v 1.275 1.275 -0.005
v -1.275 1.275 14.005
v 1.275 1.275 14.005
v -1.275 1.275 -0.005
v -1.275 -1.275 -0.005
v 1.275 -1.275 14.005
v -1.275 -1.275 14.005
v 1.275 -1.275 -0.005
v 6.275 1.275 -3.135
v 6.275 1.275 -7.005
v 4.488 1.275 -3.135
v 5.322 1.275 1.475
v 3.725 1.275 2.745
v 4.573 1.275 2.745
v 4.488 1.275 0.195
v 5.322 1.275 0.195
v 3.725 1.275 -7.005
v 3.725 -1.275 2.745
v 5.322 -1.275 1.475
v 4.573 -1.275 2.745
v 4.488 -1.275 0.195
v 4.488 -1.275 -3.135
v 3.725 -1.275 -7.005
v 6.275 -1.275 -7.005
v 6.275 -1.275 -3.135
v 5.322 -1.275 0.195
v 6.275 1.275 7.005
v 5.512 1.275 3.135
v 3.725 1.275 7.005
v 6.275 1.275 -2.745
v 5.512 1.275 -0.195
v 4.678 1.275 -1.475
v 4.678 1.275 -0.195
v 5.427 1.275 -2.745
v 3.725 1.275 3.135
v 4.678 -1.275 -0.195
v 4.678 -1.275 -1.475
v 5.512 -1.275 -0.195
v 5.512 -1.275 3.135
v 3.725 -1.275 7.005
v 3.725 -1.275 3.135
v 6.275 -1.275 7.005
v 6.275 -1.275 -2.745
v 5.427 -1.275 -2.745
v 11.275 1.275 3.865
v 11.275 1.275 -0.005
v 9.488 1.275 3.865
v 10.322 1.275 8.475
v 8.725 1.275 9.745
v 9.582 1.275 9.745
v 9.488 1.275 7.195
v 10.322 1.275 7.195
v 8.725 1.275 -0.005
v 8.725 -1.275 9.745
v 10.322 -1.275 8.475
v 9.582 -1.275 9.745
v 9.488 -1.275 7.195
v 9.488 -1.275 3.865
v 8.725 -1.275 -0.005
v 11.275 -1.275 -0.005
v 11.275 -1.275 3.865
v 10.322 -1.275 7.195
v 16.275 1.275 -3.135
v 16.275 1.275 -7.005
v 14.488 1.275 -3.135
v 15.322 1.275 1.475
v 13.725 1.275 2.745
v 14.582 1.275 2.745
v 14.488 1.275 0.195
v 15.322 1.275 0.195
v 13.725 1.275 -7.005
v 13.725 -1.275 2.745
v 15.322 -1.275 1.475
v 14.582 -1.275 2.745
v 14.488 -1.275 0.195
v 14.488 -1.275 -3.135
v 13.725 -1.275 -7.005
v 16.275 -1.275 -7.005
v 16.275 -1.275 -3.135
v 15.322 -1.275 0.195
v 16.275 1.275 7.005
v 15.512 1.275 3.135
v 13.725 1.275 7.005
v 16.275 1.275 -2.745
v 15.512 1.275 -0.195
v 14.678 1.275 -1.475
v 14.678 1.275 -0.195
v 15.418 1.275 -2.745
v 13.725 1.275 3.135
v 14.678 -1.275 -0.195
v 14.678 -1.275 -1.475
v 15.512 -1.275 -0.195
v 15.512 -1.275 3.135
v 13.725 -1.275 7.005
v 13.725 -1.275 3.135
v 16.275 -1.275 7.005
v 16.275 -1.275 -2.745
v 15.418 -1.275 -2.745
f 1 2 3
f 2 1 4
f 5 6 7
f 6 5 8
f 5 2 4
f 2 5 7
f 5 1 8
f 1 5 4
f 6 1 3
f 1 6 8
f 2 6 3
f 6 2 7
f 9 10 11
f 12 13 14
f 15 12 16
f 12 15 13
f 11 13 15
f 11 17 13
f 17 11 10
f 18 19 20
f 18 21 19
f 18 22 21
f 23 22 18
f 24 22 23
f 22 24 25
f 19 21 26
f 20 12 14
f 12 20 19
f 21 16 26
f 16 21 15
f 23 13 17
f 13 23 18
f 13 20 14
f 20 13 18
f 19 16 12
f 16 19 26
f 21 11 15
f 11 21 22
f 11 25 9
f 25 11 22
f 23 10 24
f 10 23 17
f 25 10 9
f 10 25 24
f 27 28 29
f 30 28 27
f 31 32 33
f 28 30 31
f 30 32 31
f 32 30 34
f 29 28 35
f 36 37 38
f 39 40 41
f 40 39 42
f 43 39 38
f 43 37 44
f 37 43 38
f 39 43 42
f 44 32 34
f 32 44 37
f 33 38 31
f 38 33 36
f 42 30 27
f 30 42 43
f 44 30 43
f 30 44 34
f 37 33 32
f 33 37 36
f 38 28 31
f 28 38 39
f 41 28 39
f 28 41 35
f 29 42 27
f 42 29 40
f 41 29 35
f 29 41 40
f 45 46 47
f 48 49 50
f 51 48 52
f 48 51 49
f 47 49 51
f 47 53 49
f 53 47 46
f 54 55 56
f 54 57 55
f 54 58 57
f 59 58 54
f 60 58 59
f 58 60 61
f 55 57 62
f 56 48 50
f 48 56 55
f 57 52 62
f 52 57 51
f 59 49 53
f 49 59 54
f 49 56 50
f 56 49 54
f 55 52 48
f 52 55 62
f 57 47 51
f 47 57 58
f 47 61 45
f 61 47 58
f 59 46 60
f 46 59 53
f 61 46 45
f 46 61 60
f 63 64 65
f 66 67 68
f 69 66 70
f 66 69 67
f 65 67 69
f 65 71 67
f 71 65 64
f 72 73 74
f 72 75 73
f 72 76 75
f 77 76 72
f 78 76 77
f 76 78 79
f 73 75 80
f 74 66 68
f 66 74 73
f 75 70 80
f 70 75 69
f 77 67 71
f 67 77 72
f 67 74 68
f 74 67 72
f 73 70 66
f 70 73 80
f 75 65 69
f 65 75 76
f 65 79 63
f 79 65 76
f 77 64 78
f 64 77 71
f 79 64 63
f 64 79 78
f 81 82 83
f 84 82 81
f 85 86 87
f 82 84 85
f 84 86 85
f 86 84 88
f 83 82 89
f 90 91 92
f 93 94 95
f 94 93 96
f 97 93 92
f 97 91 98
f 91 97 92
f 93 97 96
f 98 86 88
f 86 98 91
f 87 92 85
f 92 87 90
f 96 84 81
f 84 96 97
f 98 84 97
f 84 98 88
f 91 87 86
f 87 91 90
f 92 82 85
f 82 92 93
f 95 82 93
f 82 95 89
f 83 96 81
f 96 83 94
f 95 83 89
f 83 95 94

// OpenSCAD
// file: vector_operations.scad
/*

    Make up for the lack of common vector operations.

    Usage:

        use <vector_operations.scad>

*/

module end_of_customization() {}

show_name = false;
if (show_name) {
    linear_extrude(2) text("vector_operations.scad", halign="center");
}

// Cumulative sum of values in v
function v_cumsum(v) = [for (a = v[0]-v[0], i = 0; i < len(v); a = a+v[i], i = i+1) a+v[i]];
    
function v_sum(v, i=0, r=0) = i<len(v) ? v_sum(v, i+1, r+v[i]) : r;

function v_add_scalar(v, s) = [ for (e = v) e + s ];
    
function v_sub_scalar(v, s) = [ for (e = v) e - s ];
    
function v_mul_scalar(v, s) = [ for (e = v) e * s ];

// The add operation is reasonably as the + operator in the language itself. 
 

function a2_add_scalar(a, s) = [ for (ae = a) v_add_scalar(ae, s) ];

// Array should be rectangular, with the same number
// of elements in each contained list.  
// That makes it different from a generic C style lists of list.
function array_transpose(a) = 
    [ for (j = [0 : 1 : len(a[0])-1]) 
        [ for (i =[0 : 1 : len(a)-1])
          a[i][j]  
        ]
    ];
        
        
module test_array_transpose() {
    a = [["cat1", "dog1"],
         ["cat2", "dog2"]]; 
    * echo("a", a);
    * echo("aT", array_transpose(a));
}

* test_array_transpose();

//Hadamard Product - - a & b must be same dimensioon
function v_o_dot(v_a, v_b) = 
    assert(len(v_a) == len(v_b), str("len(v_a)=", len(v_a), "len(v_b)=", len(v_b)))
    [ for (i = [0 : len(v_a)-1]) v_a[i] * v_b[i] ];


         
// file: dupont_pins.scad
function dupont_pin_width() = 2.54; // Using standard dimensions, rather than measured
function dupont_pin_length() = 14.0; // Using standard dimensions, rather than measured
function dupont_wire_diameter() = 1.0 + 0.25; // measured plus allowance
// file: centerable.scad
use <vector_operations.scad>


function bw_lshift(number, places) = 
    number * pow(2, places);
    
function bw_rshift(number, places) = 
    floor(number / pow(2, places));
    
function bw_extract(number, places, bits) = 
    bw_rshift(number, places) % pow(2, bits);

// A bit less brain-damaged primative shapes

CENTER = 0;   
PLUS = 1;
MINUS = 2;

FRONT = 1;
BEHIND = 2; 
RIGHT = 4;
LEFT =  8;    
ABOVE = 16;
BELOW = 32;
SIDEWISE = 64;

X_AXIS = 128;
Y_AXIS = 256;
Z_AXIS = 512;

_X_BITS = [0, 2];
_Y_BITS = [2, 2];
_Z_BITS = [4, 2];
_O_BITS = [6, 1];

_XYZO_BITMAP = [_X_BITS, _Y_BITS, _Z_BITS, _O_BITS];

function _number_to_bitvector(number) = [ 
    for (i = [0:3]) let(places = _XYZO_BITMAP[i][0], bits = _XYZO_BITMAP[i][1]) 
       bw_extract(number, places, bits) 
];
    

function _bv_to_sign(bv) = [
    for (i = [0:len(bv)]) 
        bv[i] == PLUS ? 1 :
        bv[i] == MINUS ? -1 : 0
];
    

function _center_to_dv(center, s, bv) = [
    for (i = [0:len(s)-1]) s[i] * bv[i]
];
    
function _center_to_displacement(center, size) = 
    _center_to_dv(
        center, 
        v_mul_scalar(size, 0.5),
        _bv_to_sign(_number_to_bitvector(center))); 

function _rotation_to_angles(angles) = 
    let(
         bv = v_shorten(_number_to_bitvector(angles), 3),
         signs = _bv_to_sign(bv),
         // signs = [FRONT|BEHIND, RIGHT|LEFT, ABOVE|BELOW]
         // A sign of zero for FRONT|BEHIND is treated as FRONT
         rotation = 
            [0, 0, signs[0] == 1 ? 0 :  signs[0] == -1 ? 180: 0] + 
            v_mul_scalar([0, 0, 90], signs[1]) + 
            v_mul_scalar([0, -90, 0], signs[2])
    )
    rotation;

function _rotate_size(size, rotation) =
    is_undef(rotation) ? size :
    rotation==LEFT ? [size.y, size.x, size.z] :
    assert(false);


module center_translation(size, center, rotation) {
    size_for_disp = _rotate_size(size, rotation); 
    disp = _center_to_displacement(center, size_for_disp);
    translate(disp) { 
        children();
    }
}

module center_rotation(rotation) {
    angles = _rotation_to_angles(rotation);
    rotate(angles) {
        children();
    }

}

module center_rotate(from_axis, to_axis) {
    assert(from_axis == Z_AXIS, "Not implemente yet");
    rotation =
       to_axis == X_AXIS ? [0, -90, 0] :
       to_axis == Y_AXIS ? [0, 0, 0] :
       to_axis == Z_AXIS ? [0, 0, 0] :
       assert(false);
       


    rotate(rotation) {
        children();
    }
}


module center_reflect(v) {
    assert(!is_undef(v), "You must pass an mirroring argument to center_reflect()");
    children();
    mirror(v) children();
}


function center_str_to_center(center_as_str) = 
    center_as_str == "RIGHT" ? RIGHT :
    center_as_str == "LEFT" ? LEFT :
    center_as_str == "FRONT" ? FRONT :    
    center_as_str == "BEHIND" ? BEHIND :
    center_as_str == "ABOVE" ? ABOVE :
    center_as_str == "BELOW" ? BELOW :
    assert(false, "Not implemented");
  
// main file
include <centerable.scad>
use <shapes.scad>

use <dupont_pins.scad>

/* [Show] */ 

show_customization = true;
show_mate = true;
show_default = true;
show_mated_default = true;
/* [Pin Latch] */  

// The amount of engagement in the catch as a fraction of the width
catch_width_ = 0.125; //[0: 0.05 : 0.50]

// In pin widths
catch_height_ = 1/2; //[0: 0.05 : 1]

// As a fraction of the width
leading_width_ = 0.33; //[0: 0.05 : 0.50]

// In pin widths
leading_height_ = 1/2; //[0: 0.05 : 2]

// Distance between parts in mm
clearance_ = 0.2; // [0 : 0.05 : 0.5]

fraction_pin_length = 0.5; // [0 : 0.125 : 1.0]

origin__ = "ABOVE"; // [CENTER, ABOVE]
origin_ = 
    origin__ == "CENTER" ? CENTER :
    origin__ == "ABOVE" ? ABOVE :
    assert(false);
     
opening__ = "FRONT"; // [LEFT, RIGHT, FRONT, BEHIND]
opening_ = 
    opening__ == "LEFT" ? LEFT :
    opening__ == "RIGHT" ? RIGHT :
    opening__ == "FRONT" ? FRONT :    
    opening__ == "BEHIND" ? BEHIND :
    assert(false);  



module end_customization() {}


module x_placement(index) {
    dx_spacing = 5;
    translate([index*dx_spacing, 0, 0]) {
        children();
    }
}    


x_placement(0) {
    if (show_customization) {
        dupont_pin_latch(
            fraction_pin_length, 
            opening = opening_,
            origin = origin_, 
            catch_width = catch_width_,
            catch_height = catch_height_,
            leading_width = leading_width_,
            leading_height = leading_height_,
            clearance = clearance_);
        pin_width = dupont_pin_width();
        pin_length = dupont_pin_length();
        color("red", alpha=0.1) block([pin_width, pin_width, pin_length], center=ABOVE);
    }
}

module centered_latch(fraction_pin_length) {
    dupont_pin_latch(
        fraction_pin_length, 
        opening = opening_,
        origin = CENTER, 
        catch_width = catch_width_,
        catch_height = catch_height_,
        leading_width = leading_width_,
        leading_height = leading_height_);
}
    
x_placement(1) {
    if (show_mate) {
        centered_latch(fraction_pin_length);
        rotate([0, 180, 0]) centered_latch(1-fraction_pin_length);
    }
}

x_placement(2) {
    if (show_default) {
        dupont_pin_latch();
    }   
}

x_placement(3) {
    if (show_mated_default) {
        dupont_pin_latch(origin=CENTER);
        rotate([0, 180, 0]) dupont_pin_latch(origin=CENTER); 
    }   
}


module dupont_pin_latch(
        fraction_pin_length=0.5, 
        opening=FRONT, 
        origin=ABOVE,
        catch_width = 1/8, // In pin widths
        catch_height = 1/2, // In pin widths
        leading_width = 1/3, // In pin widths 
        leading_height = 1/2, // In pin widths,
        clearance = 0.2 // In mm
        ) {
    pin_width = dupont_pin_width();
    pin_length = dupont_pin_length();

    latch_length = fraction_pin_length*pin_length;
    
    z_translation = 
        (origin == undef || origin == ABOVE) ? latch_length :
        origin == CENTER ?  0 : //-latch_length :
        assert(false, assert_msg("Bad origin: ", origin, " Should be ABOVE or CENTER"));
    origin_translation = [0, 0, z_translation]; 
    
    opening_rotation = 
        opening == LEFT ? [0, 0, 90] :
        opening == RIGHT ? [0, 0, 270] :
        opening == FRONT ? [0, 0, 180] :
        opening == BEHIND ? [0, 0, 0] :
        
        assert(false, assert_msg("Bad opening: ", opening, " Should be LEFT, RIGHT, FRONT, or BACK"));
    
    
    translate(origin_translation) {
        rotate(opening_rotation) {
            pin_latch_as_designed();
        }
    }
    
    module pin_latch_as_designed() {
        // Origin is at mid point of the catch, opening BEHIND

        z_leading = leading_height * pin_width;
        leading = [
            leading_width * pin_width, 
            pin_width, 
            z_leading
        ];
        z_catch = catch_height*pin_width;
        catch = [
            (0.5+catch_width)*pin_width, 
            pin_width, 
            z_catch
        ];
        z_catch_complement = z_catch + z_leading + 4*clearance;
        catch_complement = [
            (0.5-catch_width)*pin_width-clearance, 
            pin_width, 
            z_catch_complement
        ];
        
        z_to_catch = fraction_pin_length*pin_length;
        z_back = z_to_catch - z_catch_complement + clearance;
        
        back = [
            pin_width,
            pin_width,
            z_back
        ];
        cleared_catch_height = catch_height*pin_width + clearance;
        
        translate([0, 0, cleared_catch_height]) {
            hull() {
                translate([pin_width/2, 0, 0]) block(leading, center=BEHIND+ABOVE);
                translate([pin_width/2, 0, 0]) block(catch, center=BEHIND+BELOW);
            }
        }
        translate([pin_width/2, 0, clearance]) block(catch_complement, center=BEHIND+BELOW);
        translate([0, 0, -z_catch_complement+clearance]) block(back, center=BELOW);
    }
}
